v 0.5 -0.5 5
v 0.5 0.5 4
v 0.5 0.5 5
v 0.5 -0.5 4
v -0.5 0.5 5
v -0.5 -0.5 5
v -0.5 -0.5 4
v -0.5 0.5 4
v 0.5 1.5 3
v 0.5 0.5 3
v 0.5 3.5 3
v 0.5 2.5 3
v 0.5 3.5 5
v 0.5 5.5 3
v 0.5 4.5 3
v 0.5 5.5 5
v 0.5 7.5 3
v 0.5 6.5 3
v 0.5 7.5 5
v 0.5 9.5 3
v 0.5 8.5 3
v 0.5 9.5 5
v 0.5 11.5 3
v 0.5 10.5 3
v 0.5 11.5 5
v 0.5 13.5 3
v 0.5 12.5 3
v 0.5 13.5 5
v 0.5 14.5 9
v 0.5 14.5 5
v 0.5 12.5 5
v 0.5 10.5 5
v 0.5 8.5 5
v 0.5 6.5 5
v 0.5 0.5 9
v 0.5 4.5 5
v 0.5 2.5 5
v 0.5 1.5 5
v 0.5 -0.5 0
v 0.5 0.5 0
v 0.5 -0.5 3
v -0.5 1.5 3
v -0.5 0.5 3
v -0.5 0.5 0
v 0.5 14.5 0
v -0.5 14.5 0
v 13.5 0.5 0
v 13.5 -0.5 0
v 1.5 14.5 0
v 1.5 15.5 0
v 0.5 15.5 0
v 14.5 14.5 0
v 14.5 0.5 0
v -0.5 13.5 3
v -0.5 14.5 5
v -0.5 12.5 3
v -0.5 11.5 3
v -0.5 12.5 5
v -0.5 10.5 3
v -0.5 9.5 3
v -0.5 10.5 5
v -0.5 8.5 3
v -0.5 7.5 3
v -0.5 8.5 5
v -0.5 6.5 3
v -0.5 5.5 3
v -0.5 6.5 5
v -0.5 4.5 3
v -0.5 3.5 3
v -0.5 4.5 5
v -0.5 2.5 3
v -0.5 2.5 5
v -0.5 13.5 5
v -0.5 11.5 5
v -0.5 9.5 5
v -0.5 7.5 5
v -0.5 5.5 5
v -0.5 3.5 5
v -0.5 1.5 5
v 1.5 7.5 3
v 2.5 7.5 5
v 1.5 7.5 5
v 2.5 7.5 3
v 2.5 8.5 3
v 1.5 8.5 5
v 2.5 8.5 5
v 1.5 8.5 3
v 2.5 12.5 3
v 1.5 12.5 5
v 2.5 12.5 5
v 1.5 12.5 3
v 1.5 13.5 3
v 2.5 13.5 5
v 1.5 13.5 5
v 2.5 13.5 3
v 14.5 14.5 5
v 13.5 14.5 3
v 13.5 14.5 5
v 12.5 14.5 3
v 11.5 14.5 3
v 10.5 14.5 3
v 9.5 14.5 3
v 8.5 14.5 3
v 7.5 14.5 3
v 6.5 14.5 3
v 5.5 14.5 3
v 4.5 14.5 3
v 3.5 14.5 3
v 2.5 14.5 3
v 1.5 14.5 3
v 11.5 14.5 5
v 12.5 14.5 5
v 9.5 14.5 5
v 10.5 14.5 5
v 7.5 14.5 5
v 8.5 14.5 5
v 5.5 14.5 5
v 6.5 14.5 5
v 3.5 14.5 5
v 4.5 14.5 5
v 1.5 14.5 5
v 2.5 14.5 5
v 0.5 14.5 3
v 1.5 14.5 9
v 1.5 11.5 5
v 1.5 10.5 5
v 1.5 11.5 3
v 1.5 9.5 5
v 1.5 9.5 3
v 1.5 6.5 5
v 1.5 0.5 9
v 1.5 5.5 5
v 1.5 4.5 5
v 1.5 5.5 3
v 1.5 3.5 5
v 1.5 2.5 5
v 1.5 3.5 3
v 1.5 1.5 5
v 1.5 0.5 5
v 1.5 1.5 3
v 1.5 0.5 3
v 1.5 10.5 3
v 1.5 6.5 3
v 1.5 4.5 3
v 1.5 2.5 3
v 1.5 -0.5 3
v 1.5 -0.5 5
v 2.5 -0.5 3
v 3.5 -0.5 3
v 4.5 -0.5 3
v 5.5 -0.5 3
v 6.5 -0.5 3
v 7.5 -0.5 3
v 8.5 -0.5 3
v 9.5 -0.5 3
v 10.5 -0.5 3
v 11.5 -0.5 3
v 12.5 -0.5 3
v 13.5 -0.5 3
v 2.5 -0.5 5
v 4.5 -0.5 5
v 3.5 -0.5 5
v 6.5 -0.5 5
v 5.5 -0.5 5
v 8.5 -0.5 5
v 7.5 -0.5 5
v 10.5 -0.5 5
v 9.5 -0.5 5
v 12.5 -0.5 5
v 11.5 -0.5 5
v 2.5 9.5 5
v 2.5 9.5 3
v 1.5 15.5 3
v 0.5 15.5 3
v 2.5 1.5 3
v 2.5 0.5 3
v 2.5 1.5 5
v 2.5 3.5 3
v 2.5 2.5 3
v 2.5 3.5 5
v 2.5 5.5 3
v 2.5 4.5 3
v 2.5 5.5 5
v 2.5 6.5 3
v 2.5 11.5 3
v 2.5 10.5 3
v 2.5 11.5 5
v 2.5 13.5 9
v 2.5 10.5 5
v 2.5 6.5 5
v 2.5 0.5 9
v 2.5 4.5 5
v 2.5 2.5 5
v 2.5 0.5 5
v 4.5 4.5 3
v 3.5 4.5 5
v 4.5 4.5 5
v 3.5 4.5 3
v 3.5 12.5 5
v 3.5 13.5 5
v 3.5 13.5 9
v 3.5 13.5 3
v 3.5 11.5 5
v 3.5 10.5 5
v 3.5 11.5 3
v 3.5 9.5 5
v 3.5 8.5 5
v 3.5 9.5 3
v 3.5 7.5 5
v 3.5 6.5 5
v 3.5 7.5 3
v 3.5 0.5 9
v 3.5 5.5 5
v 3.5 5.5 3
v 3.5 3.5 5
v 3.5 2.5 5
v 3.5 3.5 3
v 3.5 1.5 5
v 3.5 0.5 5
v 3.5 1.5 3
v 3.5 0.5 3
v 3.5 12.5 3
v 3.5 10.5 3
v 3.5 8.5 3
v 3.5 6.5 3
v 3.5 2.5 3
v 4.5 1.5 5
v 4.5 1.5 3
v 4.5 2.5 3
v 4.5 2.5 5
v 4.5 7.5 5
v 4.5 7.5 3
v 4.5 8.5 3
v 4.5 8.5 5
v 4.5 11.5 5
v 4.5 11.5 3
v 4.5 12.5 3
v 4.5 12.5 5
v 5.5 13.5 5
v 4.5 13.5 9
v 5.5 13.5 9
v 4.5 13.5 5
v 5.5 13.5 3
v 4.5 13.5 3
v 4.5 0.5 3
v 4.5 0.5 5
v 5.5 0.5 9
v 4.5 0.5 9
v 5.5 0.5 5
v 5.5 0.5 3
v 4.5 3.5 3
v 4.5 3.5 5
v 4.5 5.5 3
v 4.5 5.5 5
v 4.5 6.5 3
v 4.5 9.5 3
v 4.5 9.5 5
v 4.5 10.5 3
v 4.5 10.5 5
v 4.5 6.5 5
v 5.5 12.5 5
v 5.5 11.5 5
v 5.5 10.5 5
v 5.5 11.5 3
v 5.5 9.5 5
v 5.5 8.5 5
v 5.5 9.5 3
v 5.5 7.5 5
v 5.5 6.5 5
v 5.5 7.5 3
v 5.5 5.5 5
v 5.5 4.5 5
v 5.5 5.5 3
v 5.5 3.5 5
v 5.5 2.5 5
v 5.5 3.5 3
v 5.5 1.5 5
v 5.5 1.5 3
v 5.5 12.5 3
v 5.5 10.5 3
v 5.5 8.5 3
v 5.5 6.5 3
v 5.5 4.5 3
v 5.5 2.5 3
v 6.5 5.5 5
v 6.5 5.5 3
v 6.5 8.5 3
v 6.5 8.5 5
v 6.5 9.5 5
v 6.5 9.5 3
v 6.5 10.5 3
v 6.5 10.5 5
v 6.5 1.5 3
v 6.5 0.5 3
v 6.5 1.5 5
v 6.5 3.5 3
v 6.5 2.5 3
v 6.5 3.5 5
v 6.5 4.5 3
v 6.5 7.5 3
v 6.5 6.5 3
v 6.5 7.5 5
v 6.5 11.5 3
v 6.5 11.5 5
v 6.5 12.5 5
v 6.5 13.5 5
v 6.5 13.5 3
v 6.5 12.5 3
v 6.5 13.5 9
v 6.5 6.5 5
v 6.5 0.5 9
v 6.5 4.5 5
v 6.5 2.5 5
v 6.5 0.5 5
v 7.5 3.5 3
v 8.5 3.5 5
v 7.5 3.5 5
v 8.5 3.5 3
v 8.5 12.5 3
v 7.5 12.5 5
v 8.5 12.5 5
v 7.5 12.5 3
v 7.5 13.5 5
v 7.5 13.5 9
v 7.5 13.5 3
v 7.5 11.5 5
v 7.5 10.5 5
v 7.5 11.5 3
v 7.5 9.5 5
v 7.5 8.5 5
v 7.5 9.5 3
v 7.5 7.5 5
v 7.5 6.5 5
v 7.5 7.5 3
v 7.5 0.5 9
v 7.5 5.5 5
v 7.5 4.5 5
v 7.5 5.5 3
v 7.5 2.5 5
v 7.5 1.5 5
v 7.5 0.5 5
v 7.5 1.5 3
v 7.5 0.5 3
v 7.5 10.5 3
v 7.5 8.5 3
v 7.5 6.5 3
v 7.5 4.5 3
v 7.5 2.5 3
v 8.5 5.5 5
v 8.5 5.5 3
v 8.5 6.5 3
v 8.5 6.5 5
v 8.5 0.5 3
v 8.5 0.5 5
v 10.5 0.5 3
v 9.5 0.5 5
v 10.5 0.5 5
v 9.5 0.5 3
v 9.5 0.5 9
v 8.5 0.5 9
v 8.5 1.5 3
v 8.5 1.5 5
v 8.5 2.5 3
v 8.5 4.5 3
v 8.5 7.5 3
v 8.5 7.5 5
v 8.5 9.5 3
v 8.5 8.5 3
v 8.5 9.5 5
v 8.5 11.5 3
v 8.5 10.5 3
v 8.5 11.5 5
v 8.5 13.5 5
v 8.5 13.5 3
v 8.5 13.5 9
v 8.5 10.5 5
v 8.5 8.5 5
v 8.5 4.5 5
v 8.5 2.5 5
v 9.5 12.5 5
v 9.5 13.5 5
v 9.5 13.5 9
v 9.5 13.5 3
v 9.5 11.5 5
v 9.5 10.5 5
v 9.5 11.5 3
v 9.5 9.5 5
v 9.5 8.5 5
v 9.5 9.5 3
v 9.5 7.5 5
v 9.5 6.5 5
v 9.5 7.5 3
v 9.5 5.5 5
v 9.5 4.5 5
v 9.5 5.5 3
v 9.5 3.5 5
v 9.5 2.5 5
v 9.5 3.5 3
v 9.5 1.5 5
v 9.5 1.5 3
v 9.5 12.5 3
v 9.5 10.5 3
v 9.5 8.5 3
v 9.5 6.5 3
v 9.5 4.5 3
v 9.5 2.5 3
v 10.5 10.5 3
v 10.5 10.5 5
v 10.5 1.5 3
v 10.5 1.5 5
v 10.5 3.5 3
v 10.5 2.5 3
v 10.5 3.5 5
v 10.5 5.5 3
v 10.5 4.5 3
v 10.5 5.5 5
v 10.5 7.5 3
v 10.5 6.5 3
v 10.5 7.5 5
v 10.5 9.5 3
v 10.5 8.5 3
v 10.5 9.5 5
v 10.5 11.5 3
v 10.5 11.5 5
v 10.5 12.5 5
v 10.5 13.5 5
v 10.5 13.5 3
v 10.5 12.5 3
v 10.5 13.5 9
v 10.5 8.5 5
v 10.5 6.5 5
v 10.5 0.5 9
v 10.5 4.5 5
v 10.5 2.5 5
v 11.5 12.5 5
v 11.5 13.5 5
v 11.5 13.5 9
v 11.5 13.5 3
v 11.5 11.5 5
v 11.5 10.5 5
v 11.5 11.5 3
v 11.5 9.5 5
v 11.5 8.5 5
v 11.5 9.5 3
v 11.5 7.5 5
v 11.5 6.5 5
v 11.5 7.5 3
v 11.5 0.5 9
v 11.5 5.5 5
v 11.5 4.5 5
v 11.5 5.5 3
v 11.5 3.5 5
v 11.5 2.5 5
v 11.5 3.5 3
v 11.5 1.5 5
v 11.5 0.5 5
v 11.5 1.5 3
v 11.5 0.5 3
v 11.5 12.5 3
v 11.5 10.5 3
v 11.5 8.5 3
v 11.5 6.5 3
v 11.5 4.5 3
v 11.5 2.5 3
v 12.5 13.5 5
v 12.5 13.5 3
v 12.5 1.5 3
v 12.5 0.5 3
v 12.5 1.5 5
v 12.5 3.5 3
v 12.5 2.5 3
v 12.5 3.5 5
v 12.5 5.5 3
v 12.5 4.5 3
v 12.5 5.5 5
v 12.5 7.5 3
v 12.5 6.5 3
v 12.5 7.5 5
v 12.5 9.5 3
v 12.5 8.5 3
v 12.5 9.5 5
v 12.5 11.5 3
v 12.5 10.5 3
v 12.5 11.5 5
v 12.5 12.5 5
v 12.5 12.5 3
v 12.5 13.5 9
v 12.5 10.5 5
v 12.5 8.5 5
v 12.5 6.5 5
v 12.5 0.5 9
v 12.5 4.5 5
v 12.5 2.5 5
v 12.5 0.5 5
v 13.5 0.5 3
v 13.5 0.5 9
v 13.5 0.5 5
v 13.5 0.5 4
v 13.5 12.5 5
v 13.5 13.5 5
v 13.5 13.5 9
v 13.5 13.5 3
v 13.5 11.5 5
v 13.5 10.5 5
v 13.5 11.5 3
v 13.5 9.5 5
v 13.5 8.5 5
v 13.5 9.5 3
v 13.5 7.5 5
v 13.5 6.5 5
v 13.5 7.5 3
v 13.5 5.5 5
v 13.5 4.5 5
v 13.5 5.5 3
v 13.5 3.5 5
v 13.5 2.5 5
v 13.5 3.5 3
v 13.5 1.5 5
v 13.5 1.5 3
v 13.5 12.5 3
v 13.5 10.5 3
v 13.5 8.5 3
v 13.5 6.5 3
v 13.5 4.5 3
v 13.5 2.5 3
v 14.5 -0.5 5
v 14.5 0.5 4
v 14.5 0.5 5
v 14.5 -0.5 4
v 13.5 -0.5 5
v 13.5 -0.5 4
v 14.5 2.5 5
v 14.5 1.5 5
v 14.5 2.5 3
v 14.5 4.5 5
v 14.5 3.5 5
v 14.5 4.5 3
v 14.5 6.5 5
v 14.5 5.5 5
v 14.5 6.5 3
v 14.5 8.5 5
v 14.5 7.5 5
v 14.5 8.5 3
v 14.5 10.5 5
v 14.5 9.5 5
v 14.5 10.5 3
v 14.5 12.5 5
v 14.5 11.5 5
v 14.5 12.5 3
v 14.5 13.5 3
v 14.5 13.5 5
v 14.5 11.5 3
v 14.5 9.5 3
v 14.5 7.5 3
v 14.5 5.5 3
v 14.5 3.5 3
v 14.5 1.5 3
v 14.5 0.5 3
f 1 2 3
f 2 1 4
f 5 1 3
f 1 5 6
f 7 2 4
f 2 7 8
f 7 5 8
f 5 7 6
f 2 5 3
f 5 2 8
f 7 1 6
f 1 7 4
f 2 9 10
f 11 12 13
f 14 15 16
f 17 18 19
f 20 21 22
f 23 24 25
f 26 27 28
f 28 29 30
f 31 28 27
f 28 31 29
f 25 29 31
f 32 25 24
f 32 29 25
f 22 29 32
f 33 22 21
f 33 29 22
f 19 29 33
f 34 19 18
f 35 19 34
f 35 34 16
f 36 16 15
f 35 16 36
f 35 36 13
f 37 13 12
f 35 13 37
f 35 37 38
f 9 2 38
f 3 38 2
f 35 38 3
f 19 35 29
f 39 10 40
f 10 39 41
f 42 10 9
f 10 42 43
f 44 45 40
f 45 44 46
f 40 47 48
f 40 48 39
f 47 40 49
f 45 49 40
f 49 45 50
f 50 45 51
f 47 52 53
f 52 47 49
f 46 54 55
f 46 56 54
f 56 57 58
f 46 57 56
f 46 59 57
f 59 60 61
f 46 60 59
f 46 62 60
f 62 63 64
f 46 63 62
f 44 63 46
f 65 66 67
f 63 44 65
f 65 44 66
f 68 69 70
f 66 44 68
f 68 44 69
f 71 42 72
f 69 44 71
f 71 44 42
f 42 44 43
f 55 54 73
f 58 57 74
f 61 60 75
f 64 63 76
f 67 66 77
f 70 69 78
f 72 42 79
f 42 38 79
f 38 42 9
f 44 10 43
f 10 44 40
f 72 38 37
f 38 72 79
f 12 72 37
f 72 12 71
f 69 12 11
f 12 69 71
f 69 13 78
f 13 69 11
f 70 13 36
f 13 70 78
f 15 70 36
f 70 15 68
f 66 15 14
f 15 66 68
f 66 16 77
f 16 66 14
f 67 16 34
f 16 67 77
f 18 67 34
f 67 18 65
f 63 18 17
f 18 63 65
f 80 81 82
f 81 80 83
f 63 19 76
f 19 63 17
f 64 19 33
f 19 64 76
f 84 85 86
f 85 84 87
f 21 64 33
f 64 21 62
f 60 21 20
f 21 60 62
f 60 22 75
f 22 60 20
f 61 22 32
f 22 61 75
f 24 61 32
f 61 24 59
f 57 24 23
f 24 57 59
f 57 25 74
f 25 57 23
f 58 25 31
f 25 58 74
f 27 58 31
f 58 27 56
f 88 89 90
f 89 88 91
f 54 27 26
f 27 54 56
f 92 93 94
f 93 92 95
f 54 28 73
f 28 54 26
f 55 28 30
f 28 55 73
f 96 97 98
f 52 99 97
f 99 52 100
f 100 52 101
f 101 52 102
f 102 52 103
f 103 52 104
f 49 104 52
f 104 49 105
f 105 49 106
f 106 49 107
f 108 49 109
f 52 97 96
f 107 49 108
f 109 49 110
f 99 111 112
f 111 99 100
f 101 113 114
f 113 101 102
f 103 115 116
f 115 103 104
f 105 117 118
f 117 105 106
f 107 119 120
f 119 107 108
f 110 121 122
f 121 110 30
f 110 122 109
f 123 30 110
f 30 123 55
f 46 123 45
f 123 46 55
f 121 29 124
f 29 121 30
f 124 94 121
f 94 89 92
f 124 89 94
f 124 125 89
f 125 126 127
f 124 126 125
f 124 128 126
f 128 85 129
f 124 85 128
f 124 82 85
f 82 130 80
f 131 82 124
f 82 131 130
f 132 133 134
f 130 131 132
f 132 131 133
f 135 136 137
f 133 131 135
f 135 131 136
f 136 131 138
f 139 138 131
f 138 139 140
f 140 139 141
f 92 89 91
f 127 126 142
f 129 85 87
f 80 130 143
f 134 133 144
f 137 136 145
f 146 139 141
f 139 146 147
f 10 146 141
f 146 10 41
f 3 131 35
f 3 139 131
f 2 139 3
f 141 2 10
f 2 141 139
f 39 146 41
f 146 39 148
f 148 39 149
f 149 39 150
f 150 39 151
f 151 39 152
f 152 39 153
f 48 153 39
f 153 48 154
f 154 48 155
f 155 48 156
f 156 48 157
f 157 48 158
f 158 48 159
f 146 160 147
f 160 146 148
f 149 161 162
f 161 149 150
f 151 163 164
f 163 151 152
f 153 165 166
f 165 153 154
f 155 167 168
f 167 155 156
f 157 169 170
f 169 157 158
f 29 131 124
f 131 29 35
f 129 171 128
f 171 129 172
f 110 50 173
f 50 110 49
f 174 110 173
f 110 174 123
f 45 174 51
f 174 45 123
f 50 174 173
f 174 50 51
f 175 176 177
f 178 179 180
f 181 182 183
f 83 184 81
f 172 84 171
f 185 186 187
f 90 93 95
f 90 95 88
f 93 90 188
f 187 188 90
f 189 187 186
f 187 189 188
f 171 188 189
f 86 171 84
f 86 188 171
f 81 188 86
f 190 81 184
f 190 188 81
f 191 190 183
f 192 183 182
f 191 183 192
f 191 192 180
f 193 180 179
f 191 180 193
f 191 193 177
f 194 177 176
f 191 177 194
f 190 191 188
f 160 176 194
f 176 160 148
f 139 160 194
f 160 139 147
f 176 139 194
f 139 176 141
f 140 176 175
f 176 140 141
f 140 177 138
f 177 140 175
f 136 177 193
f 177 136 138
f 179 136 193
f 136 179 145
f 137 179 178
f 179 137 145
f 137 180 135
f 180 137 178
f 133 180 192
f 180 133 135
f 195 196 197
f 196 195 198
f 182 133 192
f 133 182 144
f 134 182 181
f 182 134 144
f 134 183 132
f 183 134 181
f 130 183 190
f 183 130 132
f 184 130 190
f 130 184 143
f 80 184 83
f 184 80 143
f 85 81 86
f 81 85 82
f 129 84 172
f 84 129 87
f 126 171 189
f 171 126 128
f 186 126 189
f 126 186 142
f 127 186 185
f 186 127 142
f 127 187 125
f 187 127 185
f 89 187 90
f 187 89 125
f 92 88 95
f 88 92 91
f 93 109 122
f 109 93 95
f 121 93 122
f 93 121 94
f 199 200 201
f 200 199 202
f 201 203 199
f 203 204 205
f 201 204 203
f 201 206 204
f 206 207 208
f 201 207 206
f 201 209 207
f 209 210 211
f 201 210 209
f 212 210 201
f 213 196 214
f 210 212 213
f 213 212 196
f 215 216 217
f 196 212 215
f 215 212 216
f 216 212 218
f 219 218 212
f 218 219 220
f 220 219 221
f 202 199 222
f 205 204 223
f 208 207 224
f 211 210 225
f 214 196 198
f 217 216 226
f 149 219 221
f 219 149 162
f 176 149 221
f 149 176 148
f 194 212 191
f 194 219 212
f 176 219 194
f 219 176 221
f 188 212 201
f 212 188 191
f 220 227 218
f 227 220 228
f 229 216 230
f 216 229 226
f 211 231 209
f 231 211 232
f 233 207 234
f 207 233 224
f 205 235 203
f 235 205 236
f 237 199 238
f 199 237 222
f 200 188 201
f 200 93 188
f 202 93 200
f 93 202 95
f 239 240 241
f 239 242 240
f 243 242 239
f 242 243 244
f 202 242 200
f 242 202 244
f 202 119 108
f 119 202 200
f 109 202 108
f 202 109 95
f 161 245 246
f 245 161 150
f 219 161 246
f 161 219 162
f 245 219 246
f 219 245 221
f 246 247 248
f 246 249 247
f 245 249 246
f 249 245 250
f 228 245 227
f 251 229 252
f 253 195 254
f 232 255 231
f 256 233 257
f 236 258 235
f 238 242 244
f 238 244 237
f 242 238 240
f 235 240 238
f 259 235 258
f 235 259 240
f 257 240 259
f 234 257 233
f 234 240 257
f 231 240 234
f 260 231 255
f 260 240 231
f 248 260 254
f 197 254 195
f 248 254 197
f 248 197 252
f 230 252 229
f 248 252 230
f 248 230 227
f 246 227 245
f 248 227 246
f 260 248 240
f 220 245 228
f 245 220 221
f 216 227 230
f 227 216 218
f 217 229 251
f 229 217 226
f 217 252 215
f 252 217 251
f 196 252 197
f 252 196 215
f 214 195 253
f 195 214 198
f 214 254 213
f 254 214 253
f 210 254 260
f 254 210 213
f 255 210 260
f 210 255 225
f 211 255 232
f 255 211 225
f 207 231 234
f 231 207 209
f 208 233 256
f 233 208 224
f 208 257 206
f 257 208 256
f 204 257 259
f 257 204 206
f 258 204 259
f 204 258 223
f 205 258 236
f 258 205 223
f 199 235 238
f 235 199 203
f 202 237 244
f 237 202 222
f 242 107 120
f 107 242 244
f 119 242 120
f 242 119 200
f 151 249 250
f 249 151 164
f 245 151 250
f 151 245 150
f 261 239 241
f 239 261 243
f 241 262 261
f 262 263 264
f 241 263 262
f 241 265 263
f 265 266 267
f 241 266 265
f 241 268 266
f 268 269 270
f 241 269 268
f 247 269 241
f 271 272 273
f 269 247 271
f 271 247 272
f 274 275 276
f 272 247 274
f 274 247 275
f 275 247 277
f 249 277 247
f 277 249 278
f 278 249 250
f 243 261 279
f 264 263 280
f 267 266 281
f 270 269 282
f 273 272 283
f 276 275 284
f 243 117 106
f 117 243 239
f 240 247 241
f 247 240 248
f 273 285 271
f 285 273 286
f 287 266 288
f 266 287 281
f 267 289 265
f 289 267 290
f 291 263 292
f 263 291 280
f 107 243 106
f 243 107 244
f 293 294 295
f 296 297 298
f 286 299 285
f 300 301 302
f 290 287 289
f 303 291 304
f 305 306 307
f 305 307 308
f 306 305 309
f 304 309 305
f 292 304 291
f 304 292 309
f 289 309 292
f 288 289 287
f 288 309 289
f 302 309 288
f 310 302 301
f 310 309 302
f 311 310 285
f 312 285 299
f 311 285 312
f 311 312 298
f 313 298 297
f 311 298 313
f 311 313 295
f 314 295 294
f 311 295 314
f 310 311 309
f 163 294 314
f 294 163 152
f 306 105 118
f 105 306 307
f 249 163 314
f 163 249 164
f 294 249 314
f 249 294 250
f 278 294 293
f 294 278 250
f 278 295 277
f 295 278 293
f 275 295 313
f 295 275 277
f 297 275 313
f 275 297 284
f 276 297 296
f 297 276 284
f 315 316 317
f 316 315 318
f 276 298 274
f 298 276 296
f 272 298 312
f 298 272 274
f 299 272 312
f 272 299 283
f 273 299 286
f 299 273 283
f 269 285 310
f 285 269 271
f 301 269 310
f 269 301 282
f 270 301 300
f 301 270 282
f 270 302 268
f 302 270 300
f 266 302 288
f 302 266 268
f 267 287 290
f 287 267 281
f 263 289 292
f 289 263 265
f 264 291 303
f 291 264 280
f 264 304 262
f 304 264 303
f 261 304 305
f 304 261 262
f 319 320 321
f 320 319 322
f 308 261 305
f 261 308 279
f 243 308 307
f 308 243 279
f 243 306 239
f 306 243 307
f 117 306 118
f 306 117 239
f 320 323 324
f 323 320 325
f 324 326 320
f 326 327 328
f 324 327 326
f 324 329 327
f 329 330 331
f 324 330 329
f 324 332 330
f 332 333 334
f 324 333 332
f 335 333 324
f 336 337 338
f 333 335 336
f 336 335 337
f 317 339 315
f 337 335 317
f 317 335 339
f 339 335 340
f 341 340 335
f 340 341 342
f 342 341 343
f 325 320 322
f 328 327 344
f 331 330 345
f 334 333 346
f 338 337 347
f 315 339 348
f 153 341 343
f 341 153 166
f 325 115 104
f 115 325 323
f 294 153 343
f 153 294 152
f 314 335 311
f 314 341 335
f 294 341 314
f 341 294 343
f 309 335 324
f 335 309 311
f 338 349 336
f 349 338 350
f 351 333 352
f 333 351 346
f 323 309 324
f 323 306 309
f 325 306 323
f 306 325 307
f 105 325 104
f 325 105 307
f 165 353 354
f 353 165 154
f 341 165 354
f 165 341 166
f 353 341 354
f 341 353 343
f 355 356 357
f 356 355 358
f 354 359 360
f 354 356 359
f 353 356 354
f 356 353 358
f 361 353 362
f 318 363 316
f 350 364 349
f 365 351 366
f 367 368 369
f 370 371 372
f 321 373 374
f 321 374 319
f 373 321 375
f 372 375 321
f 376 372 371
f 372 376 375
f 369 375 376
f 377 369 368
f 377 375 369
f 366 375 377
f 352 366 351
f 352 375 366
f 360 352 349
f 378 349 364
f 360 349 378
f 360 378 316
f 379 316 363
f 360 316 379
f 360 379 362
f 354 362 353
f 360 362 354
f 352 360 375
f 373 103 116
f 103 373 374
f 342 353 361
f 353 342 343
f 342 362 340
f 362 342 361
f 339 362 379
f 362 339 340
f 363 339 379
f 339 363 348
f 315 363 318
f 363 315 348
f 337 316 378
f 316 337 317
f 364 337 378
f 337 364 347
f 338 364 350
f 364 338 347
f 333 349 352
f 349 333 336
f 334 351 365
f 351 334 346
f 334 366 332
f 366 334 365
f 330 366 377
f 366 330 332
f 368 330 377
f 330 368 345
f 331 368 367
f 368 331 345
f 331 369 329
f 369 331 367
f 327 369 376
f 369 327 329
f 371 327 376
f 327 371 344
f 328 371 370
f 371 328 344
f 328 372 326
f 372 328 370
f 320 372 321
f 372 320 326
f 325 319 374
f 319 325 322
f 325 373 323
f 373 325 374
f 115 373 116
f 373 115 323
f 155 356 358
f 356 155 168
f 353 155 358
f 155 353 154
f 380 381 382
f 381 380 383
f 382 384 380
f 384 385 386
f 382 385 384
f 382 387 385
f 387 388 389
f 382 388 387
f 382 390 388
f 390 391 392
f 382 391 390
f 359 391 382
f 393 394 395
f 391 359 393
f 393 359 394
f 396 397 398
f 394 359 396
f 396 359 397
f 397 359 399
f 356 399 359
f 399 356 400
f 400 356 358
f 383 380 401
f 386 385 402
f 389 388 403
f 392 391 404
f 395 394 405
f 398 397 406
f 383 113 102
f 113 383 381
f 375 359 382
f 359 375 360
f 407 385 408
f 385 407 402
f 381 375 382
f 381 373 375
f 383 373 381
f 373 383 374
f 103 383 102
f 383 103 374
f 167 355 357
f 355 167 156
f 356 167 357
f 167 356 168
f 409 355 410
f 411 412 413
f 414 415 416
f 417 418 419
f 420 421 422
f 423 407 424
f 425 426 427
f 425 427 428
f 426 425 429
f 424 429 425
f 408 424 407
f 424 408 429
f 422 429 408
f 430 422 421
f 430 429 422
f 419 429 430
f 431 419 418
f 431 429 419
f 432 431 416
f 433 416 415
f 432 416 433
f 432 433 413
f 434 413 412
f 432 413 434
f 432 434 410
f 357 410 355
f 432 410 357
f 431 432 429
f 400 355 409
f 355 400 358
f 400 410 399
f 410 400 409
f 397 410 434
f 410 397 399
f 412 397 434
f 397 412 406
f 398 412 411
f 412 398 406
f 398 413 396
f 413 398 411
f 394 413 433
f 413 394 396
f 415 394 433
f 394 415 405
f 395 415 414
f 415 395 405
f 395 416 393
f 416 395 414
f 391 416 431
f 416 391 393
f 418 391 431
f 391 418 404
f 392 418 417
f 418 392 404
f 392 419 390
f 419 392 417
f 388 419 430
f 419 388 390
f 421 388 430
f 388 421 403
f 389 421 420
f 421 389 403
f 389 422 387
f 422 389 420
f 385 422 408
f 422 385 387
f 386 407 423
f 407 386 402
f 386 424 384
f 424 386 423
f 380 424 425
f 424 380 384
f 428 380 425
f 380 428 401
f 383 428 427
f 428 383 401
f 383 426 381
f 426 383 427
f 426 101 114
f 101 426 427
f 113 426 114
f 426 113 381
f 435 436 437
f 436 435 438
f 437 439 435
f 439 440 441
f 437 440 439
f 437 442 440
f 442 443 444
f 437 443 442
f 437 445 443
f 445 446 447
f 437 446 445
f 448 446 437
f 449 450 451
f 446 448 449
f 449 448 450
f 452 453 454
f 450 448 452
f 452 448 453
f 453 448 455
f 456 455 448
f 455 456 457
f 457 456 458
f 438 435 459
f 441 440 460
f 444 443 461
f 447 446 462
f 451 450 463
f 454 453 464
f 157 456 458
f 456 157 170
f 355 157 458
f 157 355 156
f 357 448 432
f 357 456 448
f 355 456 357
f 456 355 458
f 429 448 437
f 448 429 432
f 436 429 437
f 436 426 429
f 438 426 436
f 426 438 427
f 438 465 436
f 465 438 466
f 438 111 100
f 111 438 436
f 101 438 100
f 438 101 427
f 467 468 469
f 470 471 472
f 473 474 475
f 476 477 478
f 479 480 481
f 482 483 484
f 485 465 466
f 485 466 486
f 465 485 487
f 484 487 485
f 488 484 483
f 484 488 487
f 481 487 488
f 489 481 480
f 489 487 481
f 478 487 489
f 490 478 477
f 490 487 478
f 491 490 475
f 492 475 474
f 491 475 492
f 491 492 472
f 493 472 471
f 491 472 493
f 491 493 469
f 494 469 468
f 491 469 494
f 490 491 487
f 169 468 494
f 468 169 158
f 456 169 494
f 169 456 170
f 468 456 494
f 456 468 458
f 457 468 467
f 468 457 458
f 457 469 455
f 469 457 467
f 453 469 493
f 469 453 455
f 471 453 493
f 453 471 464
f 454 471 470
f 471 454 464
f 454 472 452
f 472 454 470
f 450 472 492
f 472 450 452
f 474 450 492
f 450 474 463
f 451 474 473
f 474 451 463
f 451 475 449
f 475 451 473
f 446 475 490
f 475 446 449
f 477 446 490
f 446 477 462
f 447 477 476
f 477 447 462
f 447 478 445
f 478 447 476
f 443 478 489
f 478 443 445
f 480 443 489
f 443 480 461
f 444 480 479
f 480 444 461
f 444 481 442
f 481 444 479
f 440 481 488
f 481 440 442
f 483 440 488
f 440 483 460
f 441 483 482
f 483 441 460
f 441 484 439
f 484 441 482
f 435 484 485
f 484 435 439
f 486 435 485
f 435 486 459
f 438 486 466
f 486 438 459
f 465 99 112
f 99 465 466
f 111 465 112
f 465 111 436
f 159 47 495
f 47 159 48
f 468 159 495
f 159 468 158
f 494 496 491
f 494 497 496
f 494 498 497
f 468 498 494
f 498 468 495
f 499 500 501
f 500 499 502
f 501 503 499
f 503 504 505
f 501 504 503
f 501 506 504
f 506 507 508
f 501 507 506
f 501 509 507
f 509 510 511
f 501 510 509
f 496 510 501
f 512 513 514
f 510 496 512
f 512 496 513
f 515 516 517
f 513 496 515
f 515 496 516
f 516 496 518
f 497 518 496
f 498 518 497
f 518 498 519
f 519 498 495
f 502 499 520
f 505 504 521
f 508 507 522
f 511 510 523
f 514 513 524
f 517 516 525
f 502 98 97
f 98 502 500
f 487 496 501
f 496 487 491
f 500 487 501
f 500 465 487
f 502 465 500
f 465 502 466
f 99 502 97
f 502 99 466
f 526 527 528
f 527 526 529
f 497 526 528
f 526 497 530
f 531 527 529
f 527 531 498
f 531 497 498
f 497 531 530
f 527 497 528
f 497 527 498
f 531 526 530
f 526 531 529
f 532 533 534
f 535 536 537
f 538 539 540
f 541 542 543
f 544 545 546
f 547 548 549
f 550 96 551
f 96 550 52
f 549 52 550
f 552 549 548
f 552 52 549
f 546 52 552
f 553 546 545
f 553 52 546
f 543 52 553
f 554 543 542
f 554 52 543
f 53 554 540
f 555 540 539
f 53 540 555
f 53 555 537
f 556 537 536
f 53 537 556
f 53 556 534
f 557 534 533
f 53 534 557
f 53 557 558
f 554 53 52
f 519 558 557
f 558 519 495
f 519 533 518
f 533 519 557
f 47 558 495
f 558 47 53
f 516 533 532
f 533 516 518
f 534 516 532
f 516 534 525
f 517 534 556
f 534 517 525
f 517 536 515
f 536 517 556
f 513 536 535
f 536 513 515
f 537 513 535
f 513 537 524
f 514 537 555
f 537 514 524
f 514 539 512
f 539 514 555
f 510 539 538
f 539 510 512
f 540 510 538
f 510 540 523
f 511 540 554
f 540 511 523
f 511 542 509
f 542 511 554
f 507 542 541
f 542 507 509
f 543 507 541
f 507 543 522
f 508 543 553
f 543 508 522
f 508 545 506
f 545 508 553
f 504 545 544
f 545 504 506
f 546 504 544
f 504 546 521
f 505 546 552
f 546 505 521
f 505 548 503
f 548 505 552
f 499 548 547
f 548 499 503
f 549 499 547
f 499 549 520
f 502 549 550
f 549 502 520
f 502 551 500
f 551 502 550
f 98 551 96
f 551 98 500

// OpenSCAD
union() {
    translate([0, 0, 4.5]) color([1, 0, 0]) cube([1, 1, 1], center=true);
    translate([0, 1, 1.5]) cube([1, 1, 3], center=true);
    translate([0, 2, 2.5]) cube([1, 1, 5], center=true);
    translate([0, 3, 1.5]) cube([1, 1, 3], center=true);
    translate([0, 4, 2.5]) cube([1, 1, 5], center=true);
    translate([0, 5, 1.5]) cube([1, 1, 3], center=true);
    translate([0, 6, 2.5]) cube([1, 1, 5], center=true);
    translate([0, 7, 1.5]) cube([1, 1, 3], center=true);
    translate([0, 8, 2.5]) cube([1, 1, 5], center=true);
    translate([0, 9, 1.5]) cube([1, 1, 3], center=true);
    translate([0, 10, 2.5]) cube([1, 1, 5], center=true);
    translate([0, 11, 1.5]) cube([1, 1, 3], center=true);
    translate([0, 12, 2.5]) cube([1, 1, 5], center=true);
    translate([0, 13, 1.5]) cube([1, 1, 3], center=true);
    translate([0, 14, 2.5]) cube([1, 1, 5], center=true);
    translate([1, 0, 1.5]) cube([1, 1, 3], center=true);
    translate([1, 1, 4.5]) cube([1, 1, 9], center=true);
    translate([1, 2, 4.5]) cube([1, 1, 9], center=true);
    translate([1, 3, 4.5]) cube([1, 1, 9], center=true);
    translate([1, 4, 4.5]) cube([1, 1, 9], center=true);
    translate([1, 5, 4.5]) cube([1, 1, 9], center=true);
    translate([1, 6, 4.5]) cube([1, 1, 9], center=true);
    translate([1, 7, 4.5]) cube([1, 1, 9], center=true);
    translate([1, 8, 4.5]) cube([1, 1, 9], center=true);
    translate([1, 9, 4.5]) cube([1, 1, 9], center=true);
    translate([1, 10, 4.5]) cube([1, 1, 9], center=true);
    translate([1, 11, 4.5]) cube([1, 1, 9], center=true);
    translate([1, 12, 4.5]) cube([1, 1, 9], center=true);
    translate([1, 13, 4.5]) cube([1, 1, 9], center=true);
    translate([1, 14, 4.5]) cube([1, 1, 9], center=true);
    translate([1, 15, 1.5]) cube([1, 1, 3], center=true);
    translate([2, 0, 2.5]) cube([1, 1, 5], center=true);
    translate([2, 1, 1.5]) cube([1, 1, 3], center=true);
    translate([2, 2, 2.5]) cube([1, 1, 5], center=true);
    translate([2, 3, 1.5]) cube([1, 1, 3], center=true);
    translate([2, 4, 2.5]) cube([1, 1, 5], center=true);
    translate([2, 5, 1.5]) cube([1, 1, 3], center=true);
    translate([2, 6, 2.5]) cube([1, 1, 5], center=true);
    translate([2, 7, 1.5]) cube([1, 1, 3], center=true);
    translate([2, 8, 2.5]) cube([1, 1, 5], center=true);
    translate([2, 9, 1.5]) cube([1, 1, 3], center=true);
    translate([2, 10, 2.5]) cube([1, 1, 5], center=true);
    translate([2, 11, 1.5]) cube([1, 1, 3], center=true);
    translate([2, 12, 2.5]) cube([1, 1, 5], center=true);
    translate([2, 13, 1.5]) cube([1, 1, 3], center=true);
    translate([2, 14, 2.5]) cube([1, 1, 5], center=true);
    translate([3, 0, 1.5]) cube([1, 1, 3], center=true);
    translate([3, 1, 4.5]) cube([1, 1, 9], center=true);
    translate([3, 2, 4.5]) cube([1, 1, 9], center=true);
    translate([3, 3, 4.5]) cube([1, 1, 9], center=true);
    translate([3, 4, 4.5]) cube([1, 1, 9], center=true);
    translate([3, 5, 4.5]) cube([1, 1, 9], center=true);
    translate([3, 6, 4.5]) cube([1, 1, 9], center=true);
    translate([3, 7, 4.5]) cube([1, 1, 9], center=true);
    translate([3, 8, 4.5]) cube([1, 1, 9], center=true);
    translate([3, 9, 4.5]) cube([1, 1, 9], center=true);
    translate([3, 10, 4.5]) cube([1, 1, 9], center=true);
    translate([3, 11, 4.5]) cube([1, 1, 9], center=true);
    translate([3, 12, 4.5]) cube([1, 1, 9], center=true);
    translate([3, 13, 4.5]) cube([1, 1, 9], center=true);
    translate([3, 14, 1.5]) cube([1, 1, 3], center=true);
    translate([4, 0, 2.5]) cube([1, 1, 5], center=true);
    translate([4, 1, 1.5]) cube([1, 1, 3], center=true);
    translate([4, 2, 2.5]) cube([1, 1, 5], center=true);
    translate([4, 3, 1.5]) cube([1, 1, 3], center=true);
    translate([4, 4, 2.5]) cube([1, 1, 5], center=true);
    translate([4, 5, 1.5]) cube([1, 1, 3], center=true);
    translate([4, 6, 2.5]) cube([1, 1, 5], center=true);
    translate([4, 7, 1.5]) cube([1, 1, 3], center=true);
    translate([4, 8, 2.5]) cube([1, 1, 5], center=true);
    translate([4, 9, 1.5]) cube([1, 1, 3], center=true);
    translate([4, 10, 2.5]) cube([1, 1, 5], center=true);
    translate([4, 11, 1.5]) cube([1, 1, 3], center=true);
    translate([4, 12, 2.5]) cube([1, 1, 5], center=true);
    translate([4, 13, 1.5]) cube([1, 1, 3], center=true);
    translate([4, 14, 2.5]) cube([1, 1, 5], center=true);
    translate([5, 0, 1.5]) cube([1, 1, 3], center=true);
    translate([5, 1, 4.5]) cube([1, 1, 9], center=true);
    translate([5, 2, 4.5]) cube([1, 1, 9], center=true);
    translate([5, 3, 4.5]) cube([1, 1, 9], center=true);
    translate([5, 4, 4.5]) cube([1, 1, 9], center=true);
    translate([5, 5, 4.5]) cube([1, 1, 9], center=true);
    translate([5, 6, 4.5]) cube([1, 1, 9], center=true);
    translate([5, 7, 4.5]) cube([1, 1, 9], center=true);
    translate([5, 8, 4.5]) cube([1, 1, 9], center=true);
    translate([5, 9, 4.5]) cube([1, 1, 9], center=true);
    translate([5, 10, 4.5]) cube([1, 1, 9], center=true);
    translate([5, 11, 4.5]) cube([1, 1, 9], center=true);
    translate([5, 12, 4.5]) cube([1, 1, 9], center=true);
    translate([5, 13, 4.5]) cube([1, 1, 9], center=true);
    translate([5, 14, 1.5]) cube([1, 1, 3], center=true);
    translate([6, 0, 2.5]) cube([1, 1, 5], center=true);
    translate([6, 1, 1.5]) cube([1, 1, 3], center=true);
    translate([6, 2, 2.5]) cube([1, 1, 5], center=true);
    translate([6, 3, 1.5]) cube([1, 1, 3], center=true);
    translate([6, 4, 2.5]) cube([1, 1, 5], center=true);
    translate([6, 5, 1.5]) cube([1, 1, 3], center=true);
    translate([6, 6, 2.5]) cube([1, 1, 5], center=true);
    translate([6, 7, 1.5]) cube([1, 1, 3], center=true);
    translate([6, 8, 2.5]) cube([1, 1, 5], center=true);
    translate([6, 9, 1.5]) cube([1, 1, 3], center=true);
    translate([6, 10, 2.5]) cube([1, 1, 5], center=true);
    translate([6, 11, 1.5]) cube([1, 1, 3], center=true);
    translate([6, 12, 2.5]) cube([1, 1, 5], center=true);
    translate([6, 13, 1.5]) cube([1, 1, 3], center=true);
    translate([6, 14, 2.5]) cube([1, 1, 5], center=true);
    translate([7, 0, 1.5]) cube([1, 1, 3], center=true);
    translate([7, 1, 4.5]) cube([1, 1, 9], center=true);
    translate([7, 2, 4.5]) cube([1, 1, 9], center=true);
    translate([7, 3, 4.5]) cube([1, 1, 9], center=true);
    translate([7, 4, 4.5]) cube([1, 1, 9], center=true);
    translate([7, 5, 4.5]) cube([1, 1, 9], center=true);
    translate([7, 6, 4.5]) cube([1, 1, 9], center=true);
    translate([7, 7, 4.5]) cube([1, 1, 9], center=true);
    translate([7, 8, 4.5]) cube([1, 1, 9], center=true);
    translate([7, 9, 4.5]) cube([1, 1, 9], center=true);
    translate([7, 10, 4.5]) cube([1, 1, 9], center=true);
    translate([7, 11, 4.5]) cube([1, 1, 9], center=true);
    translate([7, 12, 4.5]) cube([1, 1, 9], center=true);
    translate([7, 13, 4.5]) cube([1, 1, 9], center=true);
    translate([7, 14, 1.5]) cube([1, 1, 3], center=true);
    translate([8, 0, 2.5]) cube([1, 1, 5], center=true);
    translate([8, 1, 1.5]) cube([1, 1, 3], center=true);
    translate([8, 2, 2.5]) cube([1, 1, 5], center=true);
    translate([8, 3, 1.5]) cube([1, 1, 3], center=true);
    translate([8, 4, 2.5]) cube([1, 1, 5], center=true);
    translate([8, 5, 1.5]) cube([1, 1, 3], center=true);
    translate([8, 6, 2.5]) cube([1, 1, 5], center=true);
    translate([8, 7, 1.5]) cube([1, 1, 3], center=true);
    translate([8, 8, 2.5]) cube([1, 1, 5], center=true);
    translate([8, 9, 1.5]) cube([1, 1, 3], center=true);
    translate([8, 10, 2.5]) cube([1, 1, 5], center=true);
    translate([8, 11, 1.5]) cube([1, 1, 3], center=true);
    translate([8, 12, 2.5]) cube([1, 1, 5], center=true);
    translate([8, 13, 1.5]) cube([1, 1, 3], center=true);
    translate([8, 14, 2.5]) cube([1, 1, 5], center=true);
    translate([9, 0, 1.5]) cube([1, 1, 3], center=true);
    translate([9, 1, 4.5]) cube([1, 1, 9], center=true);
    translate([9, 2, 4.5]) cube([1, 1, 9], center=true);
    translate([9, 3, 4.5]) cube([1, 1, 9], center=true);
    translate([9, 4, 4.5]) cube([1, 1, 9], center=true);
    translate([9, 5, 4.5]) cube([1, 1, 9], center=true);
    translate([9, 6, 4.5]) cube([1, 1, 9], center=true);
    translate([9, 7, 4.5]) cube([1, 1, 9], center=true);
    translate([9, 8, 4.5]) cube([1, 1, 9], center=true);
    translate([9, 9, 4.5]) cube([1, 1, 9], center=true);
    translate([9, 10, 4.5]) cube([1, 1, 9], center=true);
    translate([9, 11, 4.5]) cube([1, 1, 9], center=true);
    translate([9, 12, 4.5]) cube([1, 1, 9], center=true);
    translate([9, 13, 4.5]) cube([1, 1, 9], center=true);
    translate([9, 14, 1.5]) cube([1, 1, 3], center=true);
    translate([10, 0, 2.5]) cube([1, 1, 5], center=true);
    translate([10, 1, 1.5]) cube([1, 1, 3], center=true);
    translate([10, 2, 2.5]) cube([1, 1, 5], center=true);
    translate([10, 3, 1.5]) cube([1, 1, 3], center=true);
    translate([10, 4, 2.5]) cube([1, 1, 5], center=true);
    translate([10, 5, 1.5]) cube([1, 1, 3], center=true);
    translate([10, 6, 2.5]) cube([1, 1, 5], center=true);
    translate([10, 7, 1.5]) cube([1, 1, 3], center=true);
    translate([10, 8, 2.5]) cube([1, 1, 5], center=true);
    translate([10, 9, 1.5]) cube([1, 1, 3], center=true);
    translate([10, 10, 2.5]) cube([1, 1, 5], center=true);
    translate([10, 11, 1.5]) cube([1, 1, 3], center=true);
    translate([10, 12, 2.5]) cube([1, 1, 5], center=true);
    translate([10, 13, 1.5]) cube([1, 1, 3], center=true);
    translate([10, 14, 2.5]) cube([1, 1, 5], center=true);
    translate([11, 0, 1.5]) cube([1, 1, 3], center=true);
    translate([11, 1, 4.5]) cube([1, 1, 9], center=true);
    translate([11, 2, 4.5]) cube([1, 1, 9], center=true);
    translate([11, 3, 4.5]) cube([1, 1, 9], center=true);
    translate([11, 4, 4.5]) cube([1, 1, 9], center=true);
    translate([11, 5, 4.5]) cube([1, 1, 9], center=true);
    translate([11, 6, 4.5]) cube([1, 1, 9], center=true);
    translate([11, 7, 4.5]) cube([1, 1, 9], center=true);
    translate([11, 8, 4.5]) cube([1, 1, 9], center=true);
    translate([11, 9, 4.5]) cube([1, 1, 9], center=true);
    translate([11, 10, 4.5]) cube([1, 1, 9], center=true);
    translate([11, 11, 4.5]) cube([1, 1, 9], center=true);
    translate([11, 12, 4.5]) cube([1, 1, 9], center=true);
    translate([11, 13, 4.5]) cube([1, 1, 9], center=true);
    translate([11, 14, 1.5]) cube([1, 1, 3], center=true);
    translate([12, 0, 2.5]) cube([1, 1, 5], center=true);
    translate([12, 1, 1.5]) cube([1, 1, 3], center=true);
    translate([12, 2, 2.5]) cube([1, 1, 5], center=true);
    translate([12, 3, 1.5]) cube([1, 1, 3], center=true);
    translate([12, 4, 2.5]) cube([1, 1, 5], center=true);
    translate([12, 5, 1.5]) cube([1, 1, 3], center=true);
    translate([12, 6, 2.5]) cube([1, 1, 5], center=true);
    translate([12, 7, 1.5]) cube([1, 1, 3], center=true);
    translate([12, 8, 2.5]) cube([1, 1, 5], center=true);
    translate([12, 9, 1.5]) cube([1, 1, 3], center=true);
    translate([12, 10, 2.5]) cube([1, 1, 5], center=true);
    translate([12, 11, 1.5]) cube([1, 1, 3], center=true);
    translate([12, 12, 2.5]) cube([1, 1, 5], center=true);
    translate([12, 13, 1.5]) cube([1, 1, 3], center=true);
    translate([12, 14, 2.5]) cube([1, 1, 5], center=true);
    translate([13, 0, 1.5]) cube([1, 1, 3], center=true);
    translate([13, 1, 4.5]) cube([1, 1, 9], center=true);
    translate([13, 2, 4.5]) cube([1, 1, 9], center=true);
    translate([13, 3, 4.5]) cube([1, 1, 9], center=true);
    translate([13, 4, 4.5]) cube([1, 1, 9], center=true);
    translate([13, 5, 4.5]) cube([1, 1, 9], center=true);
    translate([13, 6, 4.5]) cube([1, 1, 9], center=true);
    translate([13, 7, 4.5]) cube([1, 1, 9], center=true);
    translate([13, 8, 4.5]) cube([1, 1, 9], center=true);
    translate([13, 9, 4.5]) cube([1, 1, 9], center=true);
    translate([13, 10, 4.5]) cube([1, 1, 9], center=true);
    translate([13, 11, 4.5]) cube([1, 1, 9], center=true);
    translate([13, 12, 4.5]) cube([1, 1, 9], center=true);
    translate([13, 13, 4.5]) cube([1, 1, 9], center=true);
    translate([13, 14, 1.5]) cube([1, 1, 3], center=true);
    translate([14, 0, 4.5]) color([0, 0, 1]) cube([1, 1, 1], center=true);
    translate([14, 1, 1.5]) cube([1, 1, 3], center=true);
    translate([14, 2, 2.5]) cube([1, 1, 5], center=true);
    translate([14, 3, 1.5]) cube([1, 1, 3], center=true);
    translate([14, 4, 2.5]) cube([1, 1, 5], center=true);
    translate([14, 5, 1.5]) cube([1, 1, 3], center=true);
    translate([14, 6, 2.5]) cube([1, 1, 5], center=true);
    translate([14, 7, 1.5]) cube([1, 1, 3], center=true);
    translate([14, 8, 2.5]) cube([1, 1, 5], center=true);
    translate([14, 9, 1.5]) cube([1, 1, 3], center=true);
    translate([14, 10, 2.5]) cube([1, 1, 5], center=true);
    translate([14, 11, 1.5]) cube([1, 1, 3], center=true);
    translate([14, 12, 2.5]) cube([1, 1, 5], center=true);
    translate([14, 13, 1.5]) cube([1, 1, 3], center=true);
    translate([14, 14, 2.5]) cube([1, 1, 5], center=true);
}
